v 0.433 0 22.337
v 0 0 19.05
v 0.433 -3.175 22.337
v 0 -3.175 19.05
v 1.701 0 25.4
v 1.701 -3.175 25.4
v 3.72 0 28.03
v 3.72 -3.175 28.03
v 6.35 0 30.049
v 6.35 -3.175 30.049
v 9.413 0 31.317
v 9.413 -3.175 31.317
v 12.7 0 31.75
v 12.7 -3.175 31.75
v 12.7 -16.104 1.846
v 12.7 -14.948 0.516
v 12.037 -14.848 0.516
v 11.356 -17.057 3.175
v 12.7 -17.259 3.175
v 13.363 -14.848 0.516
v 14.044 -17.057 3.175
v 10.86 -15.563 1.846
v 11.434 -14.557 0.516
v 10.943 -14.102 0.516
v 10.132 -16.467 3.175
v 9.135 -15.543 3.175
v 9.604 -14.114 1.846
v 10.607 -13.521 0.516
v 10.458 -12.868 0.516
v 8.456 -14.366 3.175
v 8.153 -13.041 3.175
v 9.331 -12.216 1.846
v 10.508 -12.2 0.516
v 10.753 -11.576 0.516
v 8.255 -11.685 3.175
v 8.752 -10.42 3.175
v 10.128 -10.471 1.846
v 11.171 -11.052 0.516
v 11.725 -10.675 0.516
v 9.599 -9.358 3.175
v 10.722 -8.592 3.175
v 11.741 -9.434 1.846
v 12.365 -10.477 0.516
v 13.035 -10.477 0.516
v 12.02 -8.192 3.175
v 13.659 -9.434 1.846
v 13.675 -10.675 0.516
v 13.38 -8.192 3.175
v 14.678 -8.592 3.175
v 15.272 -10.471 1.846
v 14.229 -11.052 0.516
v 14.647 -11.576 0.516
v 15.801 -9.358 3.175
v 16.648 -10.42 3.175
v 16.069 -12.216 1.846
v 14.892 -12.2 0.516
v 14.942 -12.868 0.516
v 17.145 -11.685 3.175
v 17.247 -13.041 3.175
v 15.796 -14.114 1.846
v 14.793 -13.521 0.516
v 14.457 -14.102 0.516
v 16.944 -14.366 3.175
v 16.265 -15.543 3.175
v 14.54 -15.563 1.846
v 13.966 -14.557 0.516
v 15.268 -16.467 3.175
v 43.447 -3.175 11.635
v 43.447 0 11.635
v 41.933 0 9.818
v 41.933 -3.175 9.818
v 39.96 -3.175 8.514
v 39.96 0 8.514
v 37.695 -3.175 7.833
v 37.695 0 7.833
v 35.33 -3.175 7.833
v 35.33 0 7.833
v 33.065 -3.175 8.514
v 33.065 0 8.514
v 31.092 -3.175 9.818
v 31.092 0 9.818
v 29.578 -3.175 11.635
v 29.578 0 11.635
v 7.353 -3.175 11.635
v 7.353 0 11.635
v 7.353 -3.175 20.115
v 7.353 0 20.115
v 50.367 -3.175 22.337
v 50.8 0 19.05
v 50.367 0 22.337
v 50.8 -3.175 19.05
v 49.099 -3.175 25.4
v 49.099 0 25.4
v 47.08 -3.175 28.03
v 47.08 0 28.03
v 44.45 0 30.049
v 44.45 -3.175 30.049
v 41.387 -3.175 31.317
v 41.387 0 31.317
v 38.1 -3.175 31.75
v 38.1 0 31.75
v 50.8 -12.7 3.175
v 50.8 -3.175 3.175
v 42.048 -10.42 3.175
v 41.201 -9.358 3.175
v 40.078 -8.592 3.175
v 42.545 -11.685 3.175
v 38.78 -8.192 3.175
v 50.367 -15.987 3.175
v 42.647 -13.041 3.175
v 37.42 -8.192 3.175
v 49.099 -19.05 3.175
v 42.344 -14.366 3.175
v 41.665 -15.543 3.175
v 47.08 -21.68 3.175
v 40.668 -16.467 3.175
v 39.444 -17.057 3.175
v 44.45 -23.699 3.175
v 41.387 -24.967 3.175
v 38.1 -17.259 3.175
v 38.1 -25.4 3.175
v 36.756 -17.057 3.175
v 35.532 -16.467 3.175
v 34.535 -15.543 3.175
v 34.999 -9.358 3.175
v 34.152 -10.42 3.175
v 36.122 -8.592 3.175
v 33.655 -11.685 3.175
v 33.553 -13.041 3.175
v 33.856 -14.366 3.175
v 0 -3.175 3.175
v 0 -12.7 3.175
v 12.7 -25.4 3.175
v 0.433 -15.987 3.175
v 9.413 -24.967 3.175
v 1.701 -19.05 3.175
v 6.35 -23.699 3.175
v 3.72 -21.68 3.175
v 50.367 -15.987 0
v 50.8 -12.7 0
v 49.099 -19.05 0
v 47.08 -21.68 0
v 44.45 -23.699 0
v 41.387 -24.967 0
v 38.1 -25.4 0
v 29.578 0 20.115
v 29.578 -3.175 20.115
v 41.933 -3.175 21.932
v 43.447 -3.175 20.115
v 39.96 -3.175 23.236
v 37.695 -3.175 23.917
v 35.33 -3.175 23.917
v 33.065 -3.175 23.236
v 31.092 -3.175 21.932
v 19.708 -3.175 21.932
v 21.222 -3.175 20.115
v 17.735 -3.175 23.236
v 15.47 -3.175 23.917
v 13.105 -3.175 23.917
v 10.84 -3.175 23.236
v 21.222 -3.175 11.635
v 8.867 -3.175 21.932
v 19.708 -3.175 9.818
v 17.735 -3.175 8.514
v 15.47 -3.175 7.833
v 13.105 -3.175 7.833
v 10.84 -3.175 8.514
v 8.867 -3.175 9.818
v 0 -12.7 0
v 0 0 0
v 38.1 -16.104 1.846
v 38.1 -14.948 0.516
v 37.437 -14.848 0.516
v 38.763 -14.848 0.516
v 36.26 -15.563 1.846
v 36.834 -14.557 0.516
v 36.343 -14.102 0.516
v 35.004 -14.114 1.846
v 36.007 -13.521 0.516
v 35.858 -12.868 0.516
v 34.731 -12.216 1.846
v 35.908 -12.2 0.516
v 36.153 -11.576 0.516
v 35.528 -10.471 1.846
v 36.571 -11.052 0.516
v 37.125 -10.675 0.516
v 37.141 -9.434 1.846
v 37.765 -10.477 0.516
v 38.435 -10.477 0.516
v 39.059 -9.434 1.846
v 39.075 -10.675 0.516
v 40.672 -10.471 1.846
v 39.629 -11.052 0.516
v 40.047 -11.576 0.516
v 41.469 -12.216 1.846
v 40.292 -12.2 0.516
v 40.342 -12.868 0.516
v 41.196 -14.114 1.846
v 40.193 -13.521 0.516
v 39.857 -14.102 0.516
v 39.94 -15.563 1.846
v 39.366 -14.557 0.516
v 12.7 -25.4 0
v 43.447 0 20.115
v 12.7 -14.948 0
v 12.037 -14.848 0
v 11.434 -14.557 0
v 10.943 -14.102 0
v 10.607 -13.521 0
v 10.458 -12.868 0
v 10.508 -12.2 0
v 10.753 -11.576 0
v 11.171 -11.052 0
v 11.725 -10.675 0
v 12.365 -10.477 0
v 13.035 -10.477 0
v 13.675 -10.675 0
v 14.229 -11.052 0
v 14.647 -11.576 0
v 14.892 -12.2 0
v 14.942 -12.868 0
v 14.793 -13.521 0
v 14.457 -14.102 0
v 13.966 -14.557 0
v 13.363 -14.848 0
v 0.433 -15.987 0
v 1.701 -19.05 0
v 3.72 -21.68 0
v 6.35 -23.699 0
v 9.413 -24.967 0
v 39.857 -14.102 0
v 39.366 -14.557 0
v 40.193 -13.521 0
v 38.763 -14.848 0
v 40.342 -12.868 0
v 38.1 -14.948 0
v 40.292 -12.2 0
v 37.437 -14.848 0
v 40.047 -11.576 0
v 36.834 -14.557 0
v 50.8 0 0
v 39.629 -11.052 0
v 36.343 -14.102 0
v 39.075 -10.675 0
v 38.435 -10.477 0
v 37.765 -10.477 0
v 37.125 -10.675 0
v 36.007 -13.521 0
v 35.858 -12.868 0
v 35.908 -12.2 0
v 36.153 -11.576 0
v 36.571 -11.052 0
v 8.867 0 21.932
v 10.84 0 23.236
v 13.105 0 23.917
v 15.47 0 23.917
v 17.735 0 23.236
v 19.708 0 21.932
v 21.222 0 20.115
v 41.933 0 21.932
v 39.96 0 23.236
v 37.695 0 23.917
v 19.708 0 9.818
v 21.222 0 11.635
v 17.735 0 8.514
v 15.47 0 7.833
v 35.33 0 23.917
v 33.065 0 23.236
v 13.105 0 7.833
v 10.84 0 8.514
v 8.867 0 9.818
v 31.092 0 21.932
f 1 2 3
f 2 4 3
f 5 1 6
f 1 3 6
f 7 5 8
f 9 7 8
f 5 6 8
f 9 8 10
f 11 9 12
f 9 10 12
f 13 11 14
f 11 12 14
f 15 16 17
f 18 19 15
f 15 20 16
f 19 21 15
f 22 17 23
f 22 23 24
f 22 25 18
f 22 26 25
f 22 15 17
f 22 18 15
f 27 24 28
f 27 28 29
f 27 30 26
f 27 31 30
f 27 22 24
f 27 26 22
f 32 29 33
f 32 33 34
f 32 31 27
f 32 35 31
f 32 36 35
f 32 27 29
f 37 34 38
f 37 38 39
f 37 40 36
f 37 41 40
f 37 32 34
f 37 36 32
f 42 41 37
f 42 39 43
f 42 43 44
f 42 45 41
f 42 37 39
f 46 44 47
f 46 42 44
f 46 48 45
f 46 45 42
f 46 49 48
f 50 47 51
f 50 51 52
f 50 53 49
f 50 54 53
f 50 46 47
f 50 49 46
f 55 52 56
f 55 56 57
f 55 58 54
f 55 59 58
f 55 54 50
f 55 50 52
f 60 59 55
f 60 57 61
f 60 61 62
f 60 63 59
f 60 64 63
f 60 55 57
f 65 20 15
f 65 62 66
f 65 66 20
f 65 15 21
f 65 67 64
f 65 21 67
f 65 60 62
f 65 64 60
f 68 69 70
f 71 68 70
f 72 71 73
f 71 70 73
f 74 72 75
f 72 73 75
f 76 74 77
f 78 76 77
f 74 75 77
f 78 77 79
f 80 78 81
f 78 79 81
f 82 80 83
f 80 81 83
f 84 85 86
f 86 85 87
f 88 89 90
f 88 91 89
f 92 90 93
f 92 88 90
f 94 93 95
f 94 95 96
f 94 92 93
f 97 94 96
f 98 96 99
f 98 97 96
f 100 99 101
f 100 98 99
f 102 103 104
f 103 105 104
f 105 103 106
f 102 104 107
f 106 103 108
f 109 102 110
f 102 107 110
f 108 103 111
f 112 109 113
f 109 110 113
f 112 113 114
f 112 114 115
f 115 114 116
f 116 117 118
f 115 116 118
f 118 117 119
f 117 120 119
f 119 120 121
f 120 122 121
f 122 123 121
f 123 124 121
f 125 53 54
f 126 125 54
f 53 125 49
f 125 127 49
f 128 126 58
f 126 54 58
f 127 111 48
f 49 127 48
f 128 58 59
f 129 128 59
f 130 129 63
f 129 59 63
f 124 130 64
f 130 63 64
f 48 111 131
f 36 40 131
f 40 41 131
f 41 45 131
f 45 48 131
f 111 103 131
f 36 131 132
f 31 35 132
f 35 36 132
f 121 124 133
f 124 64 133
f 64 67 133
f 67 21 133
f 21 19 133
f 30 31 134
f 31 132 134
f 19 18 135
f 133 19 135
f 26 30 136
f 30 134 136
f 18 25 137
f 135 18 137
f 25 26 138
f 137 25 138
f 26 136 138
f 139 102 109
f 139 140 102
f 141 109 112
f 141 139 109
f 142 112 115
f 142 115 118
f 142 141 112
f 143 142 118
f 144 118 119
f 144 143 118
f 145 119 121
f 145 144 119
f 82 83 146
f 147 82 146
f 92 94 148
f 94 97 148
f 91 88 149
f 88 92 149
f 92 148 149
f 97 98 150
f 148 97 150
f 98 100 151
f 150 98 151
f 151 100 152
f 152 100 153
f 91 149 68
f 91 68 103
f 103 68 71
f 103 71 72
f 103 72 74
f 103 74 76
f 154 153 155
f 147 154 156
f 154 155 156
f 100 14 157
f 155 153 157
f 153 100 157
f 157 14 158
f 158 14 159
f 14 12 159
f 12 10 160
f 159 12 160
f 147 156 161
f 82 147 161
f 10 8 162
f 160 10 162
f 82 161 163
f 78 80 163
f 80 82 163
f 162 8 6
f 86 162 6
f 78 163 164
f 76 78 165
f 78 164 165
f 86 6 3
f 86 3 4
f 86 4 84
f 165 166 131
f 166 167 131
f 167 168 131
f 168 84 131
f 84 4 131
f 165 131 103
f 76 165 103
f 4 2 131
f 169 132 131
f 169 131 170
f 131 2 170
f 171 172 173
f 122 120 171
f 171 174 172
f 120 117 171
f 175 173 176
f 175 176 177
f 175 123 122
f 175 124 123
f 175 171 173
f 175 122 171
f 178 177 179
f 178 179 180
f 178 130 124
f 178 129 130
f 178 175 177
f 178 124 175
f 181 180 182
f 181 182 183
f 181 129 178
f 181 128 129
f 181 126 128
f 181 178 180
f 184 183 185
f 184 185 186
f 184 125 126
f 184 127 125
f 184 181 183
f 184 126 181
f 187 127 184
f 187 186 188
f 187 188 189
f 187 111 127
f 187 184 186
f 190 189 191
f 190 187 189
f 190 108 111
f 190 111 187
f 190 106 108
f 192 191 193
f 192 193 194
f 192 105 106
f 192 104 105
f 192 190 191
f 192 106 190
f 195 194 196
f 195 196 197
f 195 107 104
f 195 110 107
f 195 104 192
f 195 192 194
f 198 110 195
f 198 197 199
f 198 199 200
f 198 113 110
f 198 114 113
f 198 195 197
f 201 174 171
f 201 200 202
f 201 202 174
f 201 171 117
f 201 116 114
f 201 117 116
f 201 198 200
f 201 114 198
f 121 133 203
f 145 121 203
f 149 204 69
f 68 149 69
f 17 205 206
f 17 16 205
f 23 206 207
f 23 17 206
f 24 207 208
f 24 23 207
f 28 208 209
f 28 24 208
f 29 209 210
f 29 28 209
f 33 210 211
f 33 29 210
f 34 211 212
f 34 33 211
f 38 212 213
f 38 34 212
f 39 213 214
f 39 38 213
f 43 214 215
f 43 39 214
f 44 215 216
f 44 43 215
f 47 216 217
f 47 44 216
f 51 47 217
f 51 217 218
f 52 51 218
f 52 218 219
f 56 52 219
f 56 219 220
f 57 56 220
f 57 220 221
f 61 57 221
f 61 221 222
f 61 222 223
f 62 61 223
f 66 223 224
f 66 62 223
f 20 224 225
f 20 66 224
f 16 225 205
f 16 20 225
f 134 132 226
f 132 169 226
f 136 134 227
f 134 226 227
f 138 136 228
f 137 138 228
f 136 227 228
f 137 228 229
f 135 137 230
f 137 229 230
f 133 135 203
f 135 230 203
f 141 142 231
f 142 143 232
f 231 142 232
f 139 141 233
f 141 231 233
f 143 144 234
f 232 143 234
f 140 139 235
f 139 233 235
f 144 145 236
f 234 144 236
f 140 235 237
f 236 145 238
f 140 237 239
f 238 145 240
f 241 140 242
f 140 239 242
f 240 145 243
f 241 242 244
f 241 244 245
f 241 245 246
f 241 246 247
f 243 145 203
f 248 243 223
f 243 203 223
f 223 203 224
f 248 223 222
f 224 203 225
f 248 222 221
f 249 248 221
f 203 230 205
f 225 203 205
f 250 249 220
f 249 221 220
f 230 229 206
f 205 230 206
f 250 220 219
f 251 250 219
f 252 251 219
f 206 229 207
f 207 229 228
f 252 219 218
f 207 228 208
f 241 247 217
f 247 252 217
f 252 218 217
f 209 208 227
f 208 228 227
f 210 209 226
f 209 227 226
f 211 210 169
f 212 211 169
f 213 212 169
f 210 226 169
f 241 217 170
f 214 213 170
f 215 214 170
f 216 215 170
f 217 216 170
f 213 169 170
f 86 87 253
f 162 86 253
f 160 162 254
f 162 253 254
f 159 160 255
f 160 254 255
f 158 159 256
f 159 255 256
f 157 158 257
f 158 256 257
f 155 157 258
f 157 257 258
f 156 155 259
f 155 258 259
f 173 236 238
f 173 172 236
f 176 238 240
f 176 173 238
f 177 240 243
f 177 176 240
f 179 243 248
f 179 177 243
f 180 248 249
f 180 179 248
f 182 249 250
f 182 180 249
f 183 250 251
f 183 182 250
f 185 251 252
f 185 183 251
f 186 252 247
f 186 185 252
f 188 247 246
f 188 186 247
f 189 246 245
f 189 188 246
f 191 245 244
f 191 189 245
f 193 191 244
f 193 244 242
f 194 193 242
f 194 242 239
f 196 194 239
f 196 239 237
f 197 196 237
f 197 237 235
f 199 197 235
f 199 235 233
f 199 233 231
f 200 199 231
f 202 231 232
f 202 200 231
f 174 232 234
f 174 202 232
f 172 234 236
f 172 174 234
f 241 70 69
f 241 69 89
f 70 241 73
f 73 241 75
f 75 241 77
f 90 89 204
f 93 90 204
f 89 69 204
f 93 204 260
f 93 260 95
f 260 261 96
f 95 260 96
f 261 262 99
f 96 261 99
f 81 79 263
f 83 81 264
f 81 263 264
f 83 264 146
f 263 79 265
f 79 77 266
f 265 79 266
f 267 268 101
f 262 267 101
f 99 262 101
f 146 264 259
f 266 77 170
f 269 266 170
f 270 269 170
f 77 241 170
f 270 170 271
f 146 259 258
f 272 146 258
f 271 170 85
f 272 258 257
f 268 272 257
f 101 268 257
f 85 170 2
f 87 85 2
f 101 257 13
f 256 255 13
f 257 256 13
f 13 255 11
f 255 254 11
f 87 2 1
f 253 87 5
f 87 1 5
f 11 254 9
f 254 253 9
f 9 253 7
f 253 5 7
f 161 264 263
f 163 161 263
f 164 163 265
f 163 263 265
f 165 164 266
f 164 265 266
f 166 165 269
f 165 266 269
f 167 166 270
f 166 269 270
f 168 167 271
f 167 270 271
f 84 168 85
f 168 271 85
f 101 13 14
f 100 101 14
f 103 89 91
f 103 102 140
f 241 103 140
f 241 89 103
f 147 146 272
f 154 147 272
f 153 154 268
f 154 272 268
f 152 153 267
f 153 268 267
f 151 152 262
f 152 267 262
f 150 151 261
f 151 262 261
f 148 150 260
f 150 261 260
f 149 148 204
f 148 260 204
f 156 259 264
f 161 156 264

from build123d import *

# Parameters (mm, degrees)
BOSS_EXTRUDE1_DEPTH                           = 50.8
CUT_EXTRUDE1_DEPTH                            = 66.068137364
FILLET1_R                                     = 12.7
CSK_FOR_8_FLAT_HEAD_SOCKET_CAP_SCREW1_A_COUNT = 2
CSK_FOR_8_FLAT_HEAD_SOCKET_CAP_SCREW1_A_PITCH = 25.4


with BuildPart() as part:
    # Sketch1 → Boss-Extrude1 (new body)
    with BuildSketch(Plane(origin=(0, 0, 0), x_dir=(0, 0, -1), z_dir=(1, 0, 0))):
        Polygon((0, 0), (-31.75, 0), (-31.75, -3.175), (-3.175, -3.175), (-3.175, -25.4), (0, -25.4), align=None)
    extrude(amount=BOSS_EXTRUDE1_DEPTH)

    # Sketch2 → Cut-Extrude1 (cut, through all)
    with BuildSketch(Plane(origin=(0, 0, 0), x_dir=(1, 0, 0), z_dir=(0, 1, 0))):
        with BuildLine():
            Line((7.3533, -11.634569083), (7.3533, -20.115430917))
            ThreePointArc((7.3533, -20.115430917), (14.2875, -24.003), (21.2217, -20.115430917))
            Line((21.2217, -20.115430917), (21.2217, -11.634569083))
            ThreePointArc((21.2217, -11.634569083), (14.2875, -7.747), (7.3533, -11.634569083))
        make_face()
        with BuildLine():
            Line((29.5783, -11.634569083), (29.5783, -20.115430917))
            ThreePointArc((29.5783, -20.115430917), (36.5125, -24.003), (43.4467, -20.115430917))
            Line((43.4467, -20.115430917), (43.4467, -11.634569083))
            ThreePointArc((43.4467, -11.634569083), (36.5125, -7.747), (29.5783, -11.634569083))
        make_face()
    extrude(amount=-CUT_EXTRUDE1_DEPTH, mode=Mode.SUBTRACT)

    # Fillet1
    fillet1_edges = [part.edges().sort_by_distance(p)[0] for p in [
        (50.8, -1.5875, 31.75),
        (50.8, -25.4, 1.5875),
        (0, -25.4, 1.5875),
        (0, -1.5875, 31.75),
    ]]
    fillet(fillet1_edges, radius=FILLET1_R)

    # Sketch4 → CSK for #8 Flat Head Socket Cap Screw1 (revolve, cut)
    with BuildSketch(Plane(origin=(12.7, -12.7, 3.175), x_dir=(0, -1, 0), z_dir=(1, 0, 0))):
        Polygon((0, 0), (0, 3.175), (2.2479, 3.175), (2.2479, 2.658961536), (4.5593, 0), align=None)
    csk_for_8_flat_head_socket_cap_screw1 = revolve(axis=Axis((12.7, -12.7, 9.525), (0, 0, -1)), mode=Mode.SUBTRACT)

    # CSK for #8 Flat Head Socket Cap Screw1 a: CSK for #8 Flat Head Socket Cap Screw1 ×2
    with Locations(*[(i * CSK_FOR_8_FLAT_HEAD_SOCKET_CAP_SCREW1_A_PITCH, 0, 0) for i in range(1, CSK_FOR_8_FLAT_HEAD_SOCKET_CAP_SCREW1_A_COUNT)]):
        add(csk_for_8_flat_head_socket_cap_screw1, mode=Mode.SUBTRACT)


solid = part.part
